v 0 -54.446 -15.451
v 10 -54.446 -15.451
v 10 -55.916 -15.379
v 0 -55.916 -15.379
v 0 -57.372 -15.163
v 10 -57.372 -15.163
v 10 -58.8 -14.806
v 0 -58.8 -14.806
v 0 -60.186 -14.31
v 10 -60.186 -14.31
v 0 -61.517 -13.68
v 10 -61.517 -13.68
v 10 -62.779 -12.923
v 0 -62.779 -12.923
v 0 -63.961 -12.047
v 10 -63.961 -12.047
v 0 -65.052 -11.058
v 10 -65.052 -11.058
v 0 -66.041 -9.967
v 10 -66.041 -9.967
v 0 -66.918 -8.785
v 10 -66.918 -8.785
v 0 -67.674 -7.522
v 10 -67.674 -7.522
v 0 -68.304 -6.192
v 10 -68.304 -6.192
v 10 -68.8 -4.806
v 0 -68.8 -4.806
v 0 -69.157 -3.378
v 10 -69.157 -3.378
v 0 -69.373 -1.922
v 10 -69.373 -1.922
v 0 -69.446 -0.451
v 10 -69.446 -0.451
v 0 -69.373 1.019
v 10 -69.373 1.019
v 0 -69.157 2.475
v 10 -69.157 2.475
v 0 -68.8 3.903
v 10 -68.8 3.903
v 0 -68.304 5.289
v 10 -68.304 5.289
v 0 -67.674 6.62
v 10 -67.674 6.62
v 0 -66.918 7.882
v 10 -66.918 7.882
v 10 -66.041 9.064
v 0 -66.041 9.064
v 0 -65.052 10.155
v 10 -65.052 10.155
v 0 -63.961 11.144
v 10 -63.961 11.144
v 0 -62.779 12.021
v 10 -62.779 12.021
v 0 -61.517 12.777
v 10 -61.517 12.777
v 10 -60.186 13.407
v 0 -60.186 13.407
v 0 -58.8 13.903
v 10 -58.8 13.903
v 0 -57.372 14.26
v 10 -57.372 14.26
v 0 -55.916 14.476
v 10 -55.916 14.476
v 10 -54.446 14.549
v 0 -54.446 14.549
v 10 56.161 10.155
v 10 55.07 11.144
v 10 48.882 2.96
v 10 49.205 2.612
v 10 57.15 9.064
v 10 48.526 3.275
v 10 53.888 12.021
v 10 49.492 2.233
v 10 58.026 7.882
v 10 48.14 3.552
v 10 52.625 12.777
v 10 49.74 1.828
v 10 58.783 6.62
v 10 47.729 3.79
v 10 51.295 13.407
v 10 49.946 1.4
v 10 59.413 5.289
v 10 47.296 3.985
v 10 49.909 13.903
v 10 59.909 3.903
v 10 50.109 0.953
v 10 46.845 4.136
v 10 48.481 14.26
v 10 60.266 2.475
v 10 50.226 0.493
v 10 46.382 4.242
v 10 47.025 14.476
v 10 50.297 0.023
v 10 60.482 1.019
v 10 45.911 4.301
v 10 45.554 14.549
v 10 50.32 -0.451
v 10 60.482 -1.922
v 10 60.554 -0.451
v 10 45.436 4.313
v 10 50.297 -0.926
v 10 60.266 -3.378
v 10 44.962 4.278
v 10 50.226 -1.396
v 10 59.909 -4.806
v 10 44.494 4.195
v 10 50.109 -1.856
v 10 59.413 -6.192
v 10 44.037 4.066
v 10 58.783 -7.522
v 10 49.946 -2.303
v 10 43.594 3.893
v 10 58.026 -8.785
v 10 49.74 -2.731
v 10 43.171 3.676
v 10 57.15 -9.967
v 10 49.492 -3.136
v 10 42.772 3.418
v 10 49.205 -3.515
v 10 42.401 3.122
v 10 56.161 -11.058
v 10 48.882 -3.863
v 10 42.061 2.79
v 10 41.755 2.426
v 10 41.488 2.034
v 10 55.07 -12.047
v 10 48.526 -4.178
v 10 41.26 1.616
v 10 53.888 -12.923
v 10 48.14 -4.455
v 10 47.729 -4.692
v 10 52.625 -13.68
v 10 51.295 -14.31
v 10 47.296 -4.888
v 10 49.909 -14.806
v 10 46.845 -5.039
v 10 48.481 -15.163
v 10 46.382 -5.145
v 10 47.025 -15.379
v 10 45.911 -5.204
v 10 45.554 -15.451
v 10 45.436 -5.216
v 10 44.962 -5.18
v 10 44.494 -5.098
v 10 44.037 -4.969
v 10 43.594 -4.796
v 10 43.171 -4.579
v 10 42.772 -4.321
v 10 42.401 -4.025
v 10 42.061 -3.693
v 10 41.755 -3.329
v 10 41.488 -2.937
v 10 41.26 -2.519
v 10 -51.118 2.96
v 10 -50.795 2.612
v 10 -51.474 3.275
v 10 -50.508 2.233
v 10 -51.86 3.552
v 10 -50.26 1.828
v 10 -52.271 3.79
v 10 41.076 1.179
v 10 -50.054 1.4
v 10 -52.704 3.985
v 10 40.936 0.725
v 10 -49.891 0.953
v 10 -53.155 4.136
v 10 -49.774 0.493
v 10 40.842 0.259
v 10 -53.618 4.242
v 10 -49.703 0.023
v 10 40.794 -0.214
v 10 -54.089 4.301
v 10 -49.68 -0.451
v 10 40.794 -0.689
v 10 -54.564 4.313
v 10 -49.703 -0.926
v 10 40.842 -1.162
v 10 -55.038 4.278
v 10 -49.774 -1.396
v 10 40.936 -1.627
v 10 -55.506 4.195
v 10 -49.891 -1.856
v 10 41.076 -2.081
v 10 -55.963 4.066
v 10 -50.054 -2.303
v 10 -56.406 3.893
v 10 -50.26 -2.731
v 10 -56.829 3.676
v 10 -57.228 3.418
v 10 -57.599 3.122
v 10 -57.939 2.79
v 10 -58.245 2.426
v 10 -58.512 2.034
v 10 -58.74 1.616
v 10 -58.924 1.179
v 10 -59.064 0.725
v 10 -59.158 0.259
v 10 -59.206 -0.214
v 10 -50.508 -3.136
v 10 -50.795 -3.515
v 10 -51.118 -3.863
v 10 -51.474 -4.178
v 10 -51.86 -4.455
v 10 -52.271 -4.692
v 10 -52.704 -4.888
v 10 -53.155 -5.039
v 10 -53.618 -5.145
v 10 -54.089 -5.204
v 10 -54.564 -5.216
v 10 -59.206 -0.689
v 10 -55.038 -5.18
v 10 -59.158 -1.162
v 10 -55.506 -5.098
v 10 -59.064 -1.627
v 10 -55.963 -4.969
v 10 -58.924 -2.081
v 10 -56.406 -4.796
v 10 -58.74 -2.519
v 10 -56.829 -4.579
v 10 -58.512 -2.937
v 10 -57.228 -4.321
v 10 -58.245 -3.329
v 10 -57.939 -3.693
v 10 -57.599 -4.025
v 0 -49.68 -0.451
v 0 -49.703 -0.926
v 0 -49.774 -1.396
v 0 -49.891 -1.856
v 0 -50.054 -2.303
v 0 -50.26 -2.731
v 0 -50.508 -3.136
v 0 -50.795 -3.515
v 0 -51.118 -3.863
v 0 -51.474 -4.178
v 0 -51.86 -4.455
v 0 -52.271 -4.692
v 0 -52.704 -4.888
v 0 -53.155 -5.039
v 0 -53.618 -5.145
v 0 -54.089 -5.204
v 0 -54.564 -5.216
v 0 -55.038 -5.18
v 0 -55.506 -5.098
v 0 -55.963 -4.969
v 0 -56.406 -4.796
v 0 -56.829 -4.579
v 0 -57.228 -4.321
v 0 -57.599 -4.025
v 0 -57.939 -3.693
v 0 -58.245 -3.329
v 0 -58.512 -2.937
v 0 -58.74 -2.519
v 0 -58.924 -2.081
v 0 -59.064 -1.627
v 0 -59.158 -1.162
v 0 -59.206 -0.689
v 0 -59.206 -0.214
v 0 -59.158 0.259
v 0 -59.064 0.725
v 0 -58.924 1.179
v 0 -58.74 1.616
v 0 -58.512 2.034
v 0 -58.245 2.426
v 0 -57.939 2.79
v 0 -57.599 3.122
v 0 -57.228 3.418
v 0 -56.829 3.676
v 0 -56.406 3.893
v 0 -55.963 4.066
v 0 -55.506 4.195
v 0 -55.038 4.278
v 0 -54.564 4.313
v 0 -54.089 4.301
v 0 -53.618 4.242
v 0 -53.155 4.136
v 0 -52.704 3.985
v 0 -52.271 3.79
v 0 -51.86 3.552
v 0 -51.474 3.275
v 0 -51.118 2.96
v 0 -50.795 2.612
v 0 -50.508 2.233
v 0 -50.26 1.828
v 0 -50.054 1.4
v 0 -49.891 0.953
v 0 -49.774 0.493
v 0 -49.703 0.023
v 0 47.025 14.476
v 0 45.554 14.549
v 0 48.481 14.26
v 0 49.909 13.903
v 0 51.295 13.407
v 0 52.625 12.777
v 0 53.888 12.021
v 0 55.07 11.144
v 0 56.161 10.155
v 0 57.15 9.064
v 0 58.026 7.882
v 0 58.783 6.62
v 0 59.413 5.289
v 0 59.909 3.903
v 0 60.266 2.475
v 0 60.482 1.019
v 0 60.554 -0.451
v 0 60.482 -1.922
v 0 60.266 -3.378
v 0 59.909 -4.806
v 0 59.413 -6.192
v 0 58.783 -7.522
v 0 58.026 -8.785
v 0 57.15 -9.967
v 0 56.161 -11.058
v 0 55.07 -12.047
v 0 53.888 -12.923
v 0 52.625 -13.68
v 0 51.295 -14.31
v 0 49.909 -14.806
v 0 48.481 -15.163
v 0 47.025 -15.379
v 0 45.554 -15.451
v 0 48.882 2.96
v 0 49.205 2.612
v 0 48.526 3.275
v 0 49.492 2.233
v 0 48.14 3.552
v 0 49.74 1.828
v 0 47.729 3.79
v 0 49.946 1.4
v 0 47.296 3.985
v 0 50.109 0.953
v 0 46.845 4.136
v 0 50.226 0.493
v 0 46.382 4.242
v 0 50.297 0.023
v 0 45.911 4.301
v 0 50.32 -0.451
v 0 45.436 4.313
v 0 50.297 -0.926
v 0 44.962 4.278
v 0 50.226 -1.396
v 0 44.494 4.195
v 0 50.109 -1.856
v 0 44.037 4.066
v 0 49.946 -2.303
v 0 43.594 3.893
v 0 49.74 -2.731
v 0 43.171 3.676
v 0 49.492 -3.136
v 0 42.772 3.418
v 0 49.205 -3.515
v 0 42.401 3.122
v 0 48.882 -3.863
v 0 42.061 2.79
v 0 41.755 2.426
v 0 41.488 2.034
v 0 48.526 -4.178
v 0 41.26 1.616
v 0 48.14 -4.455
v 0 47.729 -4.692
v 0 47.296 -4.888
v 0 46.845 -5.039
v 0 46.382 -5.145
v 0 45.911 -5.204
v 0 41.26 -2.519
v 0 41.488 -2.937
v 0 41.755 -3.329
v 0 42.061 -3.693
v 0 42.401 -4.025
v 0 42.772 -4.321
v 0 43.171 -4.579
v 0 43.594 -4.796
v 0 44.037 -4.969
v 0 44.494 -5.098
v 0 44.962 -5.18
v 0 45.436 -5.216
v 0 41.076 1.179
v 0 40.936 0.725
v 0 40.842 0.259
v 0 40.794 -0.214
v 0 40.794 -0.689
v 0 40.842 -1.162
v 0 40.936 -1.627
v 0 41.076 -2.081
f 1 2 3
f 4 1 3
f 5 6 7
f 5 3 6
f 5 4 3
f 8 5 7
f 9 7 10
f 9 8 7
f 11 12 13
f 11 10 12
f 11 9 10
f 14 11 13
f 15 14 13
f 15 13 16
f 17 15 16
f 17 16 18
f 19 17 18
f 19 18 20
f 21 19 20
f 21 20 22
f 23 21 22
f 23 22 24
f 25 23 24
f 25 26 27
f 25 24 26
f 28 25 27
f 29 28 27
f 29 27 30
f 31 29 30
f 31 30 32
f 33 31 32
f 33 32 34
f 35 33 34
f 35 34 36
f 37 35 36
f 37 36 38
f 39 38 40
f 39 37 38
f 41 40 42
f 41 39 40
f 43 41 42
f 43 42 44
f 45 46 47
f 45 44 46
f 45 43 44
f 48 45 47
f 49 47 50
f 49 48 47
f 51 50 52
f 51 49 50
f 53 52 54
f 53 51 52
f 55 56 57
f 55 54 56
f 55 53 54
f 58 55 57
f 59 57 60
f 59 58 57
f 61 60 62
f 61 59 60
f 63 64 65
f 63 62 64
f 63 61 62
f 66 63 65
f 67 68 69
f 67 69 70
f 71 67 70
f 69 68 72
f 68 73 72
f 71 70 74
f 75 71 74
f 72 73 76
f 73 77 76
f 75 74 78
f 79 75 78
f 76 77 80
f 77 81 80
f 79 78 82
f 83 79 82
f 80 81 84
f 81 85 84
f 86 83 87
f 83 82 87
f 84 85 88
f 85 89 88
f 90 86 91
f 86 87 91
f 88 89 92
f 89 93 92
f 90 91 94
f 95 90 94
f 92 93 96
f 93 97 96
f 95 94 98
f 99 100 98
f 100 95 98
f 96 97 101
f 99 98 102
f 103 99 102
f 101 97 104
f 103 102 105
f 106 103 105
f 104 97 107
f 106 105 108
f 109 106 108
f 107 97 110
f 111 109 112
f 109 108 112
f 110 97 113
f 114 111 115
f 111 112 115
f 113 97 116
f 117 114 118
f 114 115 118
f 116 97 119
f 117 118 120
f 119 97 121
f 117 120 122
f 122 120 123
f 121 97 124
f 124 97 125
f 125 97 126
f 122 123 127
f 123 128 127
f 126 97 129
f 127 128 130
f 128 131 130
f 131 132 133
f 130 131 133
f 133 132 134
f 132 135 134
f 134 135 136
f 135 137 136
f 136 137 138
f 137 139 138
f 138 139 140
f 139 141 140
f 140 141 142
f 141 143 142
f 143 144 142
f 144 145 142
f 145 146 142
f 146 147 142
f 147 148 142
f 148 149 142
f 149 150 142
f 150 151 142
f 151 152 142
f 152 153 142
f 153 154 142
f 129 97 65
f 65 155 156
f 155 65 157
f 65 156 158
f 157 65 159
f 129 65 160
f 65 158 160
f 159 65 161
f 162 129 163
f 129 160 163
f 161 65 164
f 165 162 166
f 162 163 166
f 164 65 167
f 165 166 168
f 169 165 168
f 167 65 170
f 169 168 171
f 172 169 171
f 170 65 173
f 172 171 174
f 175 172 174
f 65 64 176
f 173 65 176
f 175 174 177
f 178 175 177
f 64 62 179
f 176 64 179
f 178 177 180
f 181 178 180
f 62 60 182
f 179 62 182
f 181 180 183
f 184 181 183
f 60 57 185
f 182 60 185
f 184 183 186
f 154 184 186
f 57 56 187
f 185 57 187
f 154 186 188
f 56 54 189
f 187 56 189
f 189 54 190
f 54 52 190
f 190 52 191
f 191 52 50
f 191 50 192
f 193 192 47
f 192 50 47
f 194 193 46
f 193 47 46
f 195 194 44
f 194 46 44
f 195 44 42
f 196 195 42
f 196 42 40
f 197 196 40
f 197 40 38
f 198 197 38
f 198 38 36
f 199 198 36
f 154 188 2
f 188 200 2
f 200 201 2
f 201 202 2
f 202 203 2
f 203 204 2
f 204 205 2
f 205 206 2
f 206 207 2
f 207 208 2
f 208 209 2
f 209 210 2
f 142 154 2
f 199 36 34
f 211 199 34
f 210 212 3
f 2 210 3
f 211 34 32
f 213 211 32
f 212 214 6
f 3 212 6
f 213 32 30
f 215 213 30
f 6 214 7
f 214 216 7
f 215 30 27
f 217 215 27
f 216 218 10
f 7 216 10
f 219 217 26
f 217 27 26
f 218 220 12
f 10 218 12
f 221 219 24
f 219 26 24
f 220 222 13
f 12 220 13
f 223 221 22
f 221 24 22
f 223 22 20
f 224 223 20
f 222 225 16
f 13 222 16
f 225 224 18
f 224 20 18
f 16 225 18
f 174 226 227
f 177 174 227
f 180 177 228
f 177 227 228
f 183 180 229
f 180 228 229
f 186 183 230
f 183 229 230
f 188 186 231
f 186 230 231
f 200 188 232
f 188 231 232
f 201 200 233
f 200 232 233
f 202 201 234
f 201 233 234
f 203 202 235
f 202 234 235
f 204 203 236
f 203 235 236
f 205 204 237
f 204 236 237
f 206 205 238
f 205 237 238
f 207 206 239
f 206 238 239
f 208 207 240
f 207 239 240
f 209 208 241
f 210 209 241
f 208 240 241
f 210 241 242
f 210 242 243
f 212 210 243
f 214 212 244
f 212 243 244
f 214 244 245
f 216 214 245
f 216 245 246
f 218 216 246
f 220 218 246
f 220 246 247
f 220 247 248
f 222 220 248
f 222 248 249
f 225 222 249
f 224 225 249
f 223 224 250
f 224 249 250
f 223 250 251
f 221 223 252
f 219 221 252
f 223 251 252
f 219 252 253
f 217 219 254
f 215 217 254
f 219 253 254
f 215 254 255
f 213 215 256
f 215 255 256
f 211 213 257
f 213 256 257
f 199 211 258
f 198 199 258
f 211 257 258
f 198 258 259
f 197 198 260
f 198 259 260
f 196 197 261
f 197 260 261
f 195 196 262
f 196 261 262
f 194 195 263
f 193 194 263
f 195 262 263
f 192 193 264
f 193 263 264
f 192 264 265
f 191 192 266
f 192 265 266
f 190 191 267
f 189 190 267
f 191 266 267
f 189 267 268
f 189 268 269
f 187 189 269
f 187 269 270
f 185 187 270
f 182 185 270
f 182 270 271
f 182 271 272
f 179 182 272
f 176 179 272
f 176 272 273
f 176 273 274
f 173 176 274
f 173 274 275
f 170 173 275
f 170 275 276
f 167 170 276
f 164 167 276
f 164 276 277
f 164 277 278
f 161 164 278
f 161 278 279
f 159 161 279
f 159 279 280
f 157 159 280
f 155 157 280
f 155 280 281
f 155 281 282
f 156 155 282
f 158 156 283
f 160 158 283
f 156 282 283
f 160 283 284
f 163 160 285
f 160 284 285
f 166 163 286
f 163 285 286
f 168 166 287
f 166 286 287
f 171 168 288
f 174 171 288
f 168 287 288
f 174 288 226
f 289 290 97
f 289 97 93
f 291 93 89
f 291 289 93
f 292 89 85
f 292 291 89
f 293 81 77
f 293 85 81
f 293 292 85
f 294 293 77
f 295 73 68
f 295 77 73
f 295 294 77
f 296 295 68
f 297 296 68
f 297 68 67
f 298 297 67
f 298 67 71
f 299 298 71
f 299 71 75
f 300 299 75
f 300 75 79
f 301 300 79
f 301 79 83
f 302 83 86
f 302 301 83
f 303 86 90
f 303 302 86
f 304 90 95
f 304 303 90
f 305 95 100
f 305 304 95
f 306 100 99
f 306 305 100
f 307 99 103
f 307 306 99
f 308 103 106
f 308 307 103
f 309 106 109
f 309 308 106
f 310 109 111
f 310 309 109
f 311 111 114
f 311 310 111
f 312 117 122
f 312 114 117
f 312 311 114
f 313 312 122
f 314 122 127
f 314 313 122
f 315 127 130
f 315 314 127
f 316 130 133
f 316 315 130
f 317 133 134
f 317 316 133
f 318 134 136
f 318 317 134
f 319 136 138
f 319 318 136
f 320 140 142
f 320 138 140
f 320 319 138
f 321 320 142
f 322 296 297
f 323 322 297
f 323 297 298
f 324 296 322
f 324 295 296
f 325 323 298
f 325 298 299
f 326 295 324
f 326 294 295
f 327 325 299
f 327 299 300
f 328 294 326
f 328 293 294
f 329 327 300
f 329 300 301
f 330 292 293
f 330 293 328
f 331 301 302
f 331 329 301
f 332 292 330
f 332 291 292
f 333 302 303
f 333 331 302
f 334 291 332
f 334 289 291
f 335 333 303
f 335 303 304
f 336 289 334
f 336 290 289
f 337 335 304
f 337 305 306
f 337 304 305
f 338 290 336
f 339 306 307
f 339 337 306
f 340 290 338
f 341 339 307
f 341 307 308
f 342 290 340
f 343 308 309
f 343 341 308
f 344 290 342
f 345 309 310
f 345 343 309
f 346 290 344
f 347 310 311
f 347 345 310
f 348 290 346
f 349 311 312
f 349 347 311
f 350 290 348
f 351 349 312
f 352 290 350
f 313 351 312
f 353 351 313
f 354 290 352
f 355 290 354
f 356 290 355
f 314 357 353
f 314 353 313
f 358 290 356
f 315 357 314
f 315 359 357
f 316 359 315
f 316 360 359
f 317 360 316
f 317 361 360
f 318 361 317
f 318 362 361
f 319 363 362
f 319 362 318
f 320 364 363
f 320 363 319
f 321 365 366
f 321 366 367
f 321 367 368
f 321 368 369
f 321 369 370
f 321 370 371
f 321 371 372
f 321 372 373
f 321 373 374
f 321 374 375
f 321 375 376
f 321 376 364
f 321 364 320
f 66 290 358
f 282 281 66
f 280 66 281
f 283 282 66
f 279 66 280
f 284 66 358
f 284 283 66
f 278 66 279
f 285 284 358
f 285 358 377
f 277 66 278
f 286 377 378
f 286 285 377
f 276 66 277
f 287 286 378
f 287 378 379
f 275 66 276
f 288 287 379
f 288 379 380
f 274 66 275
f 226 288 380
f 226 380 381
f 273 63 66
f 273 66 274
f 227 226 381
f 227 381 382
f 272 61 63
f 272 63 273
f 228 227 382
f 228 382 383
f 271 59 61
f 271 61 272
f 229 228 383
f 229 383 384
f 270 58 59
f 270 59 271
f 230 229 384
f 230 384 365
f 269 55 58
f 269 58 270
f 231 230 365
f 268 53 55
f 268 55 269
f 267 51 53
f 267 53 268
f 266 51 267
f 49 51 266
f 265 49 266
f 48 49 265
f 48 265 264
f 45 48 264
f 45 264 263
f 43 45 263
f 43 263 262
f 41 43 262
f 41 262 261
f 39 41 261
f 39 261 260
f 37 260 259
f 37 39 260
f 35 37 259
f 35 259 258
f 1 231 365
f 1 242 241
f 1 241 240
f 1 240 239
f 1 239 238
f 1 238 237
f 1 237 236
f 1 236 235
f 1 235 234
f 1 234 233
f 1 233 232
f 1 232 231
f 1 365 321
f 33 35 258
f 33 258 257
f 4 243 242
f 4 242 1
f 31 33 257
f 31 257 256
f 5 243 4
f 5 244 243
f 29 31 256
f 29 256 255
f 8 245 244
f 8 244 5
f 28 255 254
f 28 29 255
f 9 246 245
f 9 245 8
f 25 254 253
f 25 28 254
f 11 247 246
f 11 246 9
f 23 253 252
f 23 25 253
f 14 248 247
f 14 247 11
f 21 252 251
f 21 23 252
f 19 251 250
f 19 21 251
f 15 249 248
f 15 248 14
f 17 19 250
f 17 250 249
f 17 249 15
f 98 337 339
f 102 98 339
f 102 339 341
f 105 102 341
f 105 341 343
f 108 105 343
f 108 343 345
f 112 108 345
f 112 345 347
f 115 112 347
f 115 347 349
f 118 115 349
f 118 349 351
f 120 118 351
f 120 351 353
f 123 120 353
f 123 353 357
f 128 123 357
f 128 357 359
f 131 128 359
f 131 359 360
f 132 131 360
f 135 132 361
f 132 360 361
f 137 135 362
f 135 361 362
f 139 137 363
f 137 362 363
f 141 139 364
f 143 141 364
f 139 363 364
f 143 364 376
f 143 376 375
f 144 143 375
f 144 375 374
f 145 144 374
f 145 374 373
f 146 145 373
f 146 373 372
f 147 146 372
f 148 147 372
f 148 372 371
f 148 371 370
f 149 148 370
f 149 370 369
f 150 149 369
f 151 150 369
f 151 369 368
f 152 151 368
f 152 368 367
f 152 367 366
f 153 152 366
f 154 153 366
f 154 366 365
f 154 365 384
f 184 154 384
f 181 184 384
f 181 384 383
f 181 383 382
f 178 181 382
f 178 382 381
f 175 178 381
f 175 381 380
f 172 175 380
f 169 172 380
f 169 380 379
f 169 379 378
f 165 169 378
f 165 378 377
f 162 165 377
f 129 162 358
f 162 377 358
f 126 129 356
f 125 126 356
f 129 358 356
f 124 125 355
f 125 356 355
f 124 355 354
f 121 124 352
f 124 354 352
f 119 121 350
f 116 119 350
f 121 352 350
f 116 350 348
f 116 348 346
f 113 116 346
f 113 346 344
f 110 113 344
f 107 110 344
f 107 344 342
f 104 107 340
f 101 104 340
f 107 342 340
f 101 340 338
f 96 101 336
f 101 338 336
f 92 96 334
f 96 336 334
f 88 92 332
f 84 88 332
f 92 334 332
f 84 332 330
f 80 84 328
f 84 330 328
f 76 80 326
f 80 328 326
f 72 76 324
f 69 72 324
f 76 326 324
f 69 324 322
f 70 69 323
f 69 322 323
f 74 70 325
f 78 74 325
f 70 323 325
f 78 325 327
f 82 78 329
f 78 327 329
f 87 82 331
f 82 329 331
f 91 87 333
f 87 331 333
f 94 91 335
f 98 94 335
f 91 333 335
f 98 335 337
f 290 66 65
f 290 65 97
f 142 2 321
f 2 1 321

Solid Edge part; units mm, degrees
sketch "Sketch1" plane through (0, 0, 0) normal (1, 0, 0) x (0, 1, 0)
  line L0 (-54.4456, 14.5486) -> (45.5544, 14.5486)
  arc A0 (45.5544, -15.4514) -> (45.5544, 14.5486) centre (45.5544, -0.4514) ccw
  line L1 (-54.4456, -15.4514) -> (45.5544, -15.4514)
  arc A1 (-54.4456, 14.5486) -> (-54.4456, -15.4514) centre (-54.4456, -0.4514) ccw
extrude "Protrusion1" add sketch "Sketch1" along normal blind 10
sketch "Sketch2" plane through (0, 0, 0) normal (1, 0, 0) x (0, 1, 0)
  circle A0 centre (-54.4456, -0.4514) radius 4.7659
  circle A1 centre (45.5544, -0.4514) radius 4.7659
  dimension "D1" = 100
  dimension "D2" = 15
extrude "Cutout1" cut sketch "Sketch2" along normal blind 53.975
